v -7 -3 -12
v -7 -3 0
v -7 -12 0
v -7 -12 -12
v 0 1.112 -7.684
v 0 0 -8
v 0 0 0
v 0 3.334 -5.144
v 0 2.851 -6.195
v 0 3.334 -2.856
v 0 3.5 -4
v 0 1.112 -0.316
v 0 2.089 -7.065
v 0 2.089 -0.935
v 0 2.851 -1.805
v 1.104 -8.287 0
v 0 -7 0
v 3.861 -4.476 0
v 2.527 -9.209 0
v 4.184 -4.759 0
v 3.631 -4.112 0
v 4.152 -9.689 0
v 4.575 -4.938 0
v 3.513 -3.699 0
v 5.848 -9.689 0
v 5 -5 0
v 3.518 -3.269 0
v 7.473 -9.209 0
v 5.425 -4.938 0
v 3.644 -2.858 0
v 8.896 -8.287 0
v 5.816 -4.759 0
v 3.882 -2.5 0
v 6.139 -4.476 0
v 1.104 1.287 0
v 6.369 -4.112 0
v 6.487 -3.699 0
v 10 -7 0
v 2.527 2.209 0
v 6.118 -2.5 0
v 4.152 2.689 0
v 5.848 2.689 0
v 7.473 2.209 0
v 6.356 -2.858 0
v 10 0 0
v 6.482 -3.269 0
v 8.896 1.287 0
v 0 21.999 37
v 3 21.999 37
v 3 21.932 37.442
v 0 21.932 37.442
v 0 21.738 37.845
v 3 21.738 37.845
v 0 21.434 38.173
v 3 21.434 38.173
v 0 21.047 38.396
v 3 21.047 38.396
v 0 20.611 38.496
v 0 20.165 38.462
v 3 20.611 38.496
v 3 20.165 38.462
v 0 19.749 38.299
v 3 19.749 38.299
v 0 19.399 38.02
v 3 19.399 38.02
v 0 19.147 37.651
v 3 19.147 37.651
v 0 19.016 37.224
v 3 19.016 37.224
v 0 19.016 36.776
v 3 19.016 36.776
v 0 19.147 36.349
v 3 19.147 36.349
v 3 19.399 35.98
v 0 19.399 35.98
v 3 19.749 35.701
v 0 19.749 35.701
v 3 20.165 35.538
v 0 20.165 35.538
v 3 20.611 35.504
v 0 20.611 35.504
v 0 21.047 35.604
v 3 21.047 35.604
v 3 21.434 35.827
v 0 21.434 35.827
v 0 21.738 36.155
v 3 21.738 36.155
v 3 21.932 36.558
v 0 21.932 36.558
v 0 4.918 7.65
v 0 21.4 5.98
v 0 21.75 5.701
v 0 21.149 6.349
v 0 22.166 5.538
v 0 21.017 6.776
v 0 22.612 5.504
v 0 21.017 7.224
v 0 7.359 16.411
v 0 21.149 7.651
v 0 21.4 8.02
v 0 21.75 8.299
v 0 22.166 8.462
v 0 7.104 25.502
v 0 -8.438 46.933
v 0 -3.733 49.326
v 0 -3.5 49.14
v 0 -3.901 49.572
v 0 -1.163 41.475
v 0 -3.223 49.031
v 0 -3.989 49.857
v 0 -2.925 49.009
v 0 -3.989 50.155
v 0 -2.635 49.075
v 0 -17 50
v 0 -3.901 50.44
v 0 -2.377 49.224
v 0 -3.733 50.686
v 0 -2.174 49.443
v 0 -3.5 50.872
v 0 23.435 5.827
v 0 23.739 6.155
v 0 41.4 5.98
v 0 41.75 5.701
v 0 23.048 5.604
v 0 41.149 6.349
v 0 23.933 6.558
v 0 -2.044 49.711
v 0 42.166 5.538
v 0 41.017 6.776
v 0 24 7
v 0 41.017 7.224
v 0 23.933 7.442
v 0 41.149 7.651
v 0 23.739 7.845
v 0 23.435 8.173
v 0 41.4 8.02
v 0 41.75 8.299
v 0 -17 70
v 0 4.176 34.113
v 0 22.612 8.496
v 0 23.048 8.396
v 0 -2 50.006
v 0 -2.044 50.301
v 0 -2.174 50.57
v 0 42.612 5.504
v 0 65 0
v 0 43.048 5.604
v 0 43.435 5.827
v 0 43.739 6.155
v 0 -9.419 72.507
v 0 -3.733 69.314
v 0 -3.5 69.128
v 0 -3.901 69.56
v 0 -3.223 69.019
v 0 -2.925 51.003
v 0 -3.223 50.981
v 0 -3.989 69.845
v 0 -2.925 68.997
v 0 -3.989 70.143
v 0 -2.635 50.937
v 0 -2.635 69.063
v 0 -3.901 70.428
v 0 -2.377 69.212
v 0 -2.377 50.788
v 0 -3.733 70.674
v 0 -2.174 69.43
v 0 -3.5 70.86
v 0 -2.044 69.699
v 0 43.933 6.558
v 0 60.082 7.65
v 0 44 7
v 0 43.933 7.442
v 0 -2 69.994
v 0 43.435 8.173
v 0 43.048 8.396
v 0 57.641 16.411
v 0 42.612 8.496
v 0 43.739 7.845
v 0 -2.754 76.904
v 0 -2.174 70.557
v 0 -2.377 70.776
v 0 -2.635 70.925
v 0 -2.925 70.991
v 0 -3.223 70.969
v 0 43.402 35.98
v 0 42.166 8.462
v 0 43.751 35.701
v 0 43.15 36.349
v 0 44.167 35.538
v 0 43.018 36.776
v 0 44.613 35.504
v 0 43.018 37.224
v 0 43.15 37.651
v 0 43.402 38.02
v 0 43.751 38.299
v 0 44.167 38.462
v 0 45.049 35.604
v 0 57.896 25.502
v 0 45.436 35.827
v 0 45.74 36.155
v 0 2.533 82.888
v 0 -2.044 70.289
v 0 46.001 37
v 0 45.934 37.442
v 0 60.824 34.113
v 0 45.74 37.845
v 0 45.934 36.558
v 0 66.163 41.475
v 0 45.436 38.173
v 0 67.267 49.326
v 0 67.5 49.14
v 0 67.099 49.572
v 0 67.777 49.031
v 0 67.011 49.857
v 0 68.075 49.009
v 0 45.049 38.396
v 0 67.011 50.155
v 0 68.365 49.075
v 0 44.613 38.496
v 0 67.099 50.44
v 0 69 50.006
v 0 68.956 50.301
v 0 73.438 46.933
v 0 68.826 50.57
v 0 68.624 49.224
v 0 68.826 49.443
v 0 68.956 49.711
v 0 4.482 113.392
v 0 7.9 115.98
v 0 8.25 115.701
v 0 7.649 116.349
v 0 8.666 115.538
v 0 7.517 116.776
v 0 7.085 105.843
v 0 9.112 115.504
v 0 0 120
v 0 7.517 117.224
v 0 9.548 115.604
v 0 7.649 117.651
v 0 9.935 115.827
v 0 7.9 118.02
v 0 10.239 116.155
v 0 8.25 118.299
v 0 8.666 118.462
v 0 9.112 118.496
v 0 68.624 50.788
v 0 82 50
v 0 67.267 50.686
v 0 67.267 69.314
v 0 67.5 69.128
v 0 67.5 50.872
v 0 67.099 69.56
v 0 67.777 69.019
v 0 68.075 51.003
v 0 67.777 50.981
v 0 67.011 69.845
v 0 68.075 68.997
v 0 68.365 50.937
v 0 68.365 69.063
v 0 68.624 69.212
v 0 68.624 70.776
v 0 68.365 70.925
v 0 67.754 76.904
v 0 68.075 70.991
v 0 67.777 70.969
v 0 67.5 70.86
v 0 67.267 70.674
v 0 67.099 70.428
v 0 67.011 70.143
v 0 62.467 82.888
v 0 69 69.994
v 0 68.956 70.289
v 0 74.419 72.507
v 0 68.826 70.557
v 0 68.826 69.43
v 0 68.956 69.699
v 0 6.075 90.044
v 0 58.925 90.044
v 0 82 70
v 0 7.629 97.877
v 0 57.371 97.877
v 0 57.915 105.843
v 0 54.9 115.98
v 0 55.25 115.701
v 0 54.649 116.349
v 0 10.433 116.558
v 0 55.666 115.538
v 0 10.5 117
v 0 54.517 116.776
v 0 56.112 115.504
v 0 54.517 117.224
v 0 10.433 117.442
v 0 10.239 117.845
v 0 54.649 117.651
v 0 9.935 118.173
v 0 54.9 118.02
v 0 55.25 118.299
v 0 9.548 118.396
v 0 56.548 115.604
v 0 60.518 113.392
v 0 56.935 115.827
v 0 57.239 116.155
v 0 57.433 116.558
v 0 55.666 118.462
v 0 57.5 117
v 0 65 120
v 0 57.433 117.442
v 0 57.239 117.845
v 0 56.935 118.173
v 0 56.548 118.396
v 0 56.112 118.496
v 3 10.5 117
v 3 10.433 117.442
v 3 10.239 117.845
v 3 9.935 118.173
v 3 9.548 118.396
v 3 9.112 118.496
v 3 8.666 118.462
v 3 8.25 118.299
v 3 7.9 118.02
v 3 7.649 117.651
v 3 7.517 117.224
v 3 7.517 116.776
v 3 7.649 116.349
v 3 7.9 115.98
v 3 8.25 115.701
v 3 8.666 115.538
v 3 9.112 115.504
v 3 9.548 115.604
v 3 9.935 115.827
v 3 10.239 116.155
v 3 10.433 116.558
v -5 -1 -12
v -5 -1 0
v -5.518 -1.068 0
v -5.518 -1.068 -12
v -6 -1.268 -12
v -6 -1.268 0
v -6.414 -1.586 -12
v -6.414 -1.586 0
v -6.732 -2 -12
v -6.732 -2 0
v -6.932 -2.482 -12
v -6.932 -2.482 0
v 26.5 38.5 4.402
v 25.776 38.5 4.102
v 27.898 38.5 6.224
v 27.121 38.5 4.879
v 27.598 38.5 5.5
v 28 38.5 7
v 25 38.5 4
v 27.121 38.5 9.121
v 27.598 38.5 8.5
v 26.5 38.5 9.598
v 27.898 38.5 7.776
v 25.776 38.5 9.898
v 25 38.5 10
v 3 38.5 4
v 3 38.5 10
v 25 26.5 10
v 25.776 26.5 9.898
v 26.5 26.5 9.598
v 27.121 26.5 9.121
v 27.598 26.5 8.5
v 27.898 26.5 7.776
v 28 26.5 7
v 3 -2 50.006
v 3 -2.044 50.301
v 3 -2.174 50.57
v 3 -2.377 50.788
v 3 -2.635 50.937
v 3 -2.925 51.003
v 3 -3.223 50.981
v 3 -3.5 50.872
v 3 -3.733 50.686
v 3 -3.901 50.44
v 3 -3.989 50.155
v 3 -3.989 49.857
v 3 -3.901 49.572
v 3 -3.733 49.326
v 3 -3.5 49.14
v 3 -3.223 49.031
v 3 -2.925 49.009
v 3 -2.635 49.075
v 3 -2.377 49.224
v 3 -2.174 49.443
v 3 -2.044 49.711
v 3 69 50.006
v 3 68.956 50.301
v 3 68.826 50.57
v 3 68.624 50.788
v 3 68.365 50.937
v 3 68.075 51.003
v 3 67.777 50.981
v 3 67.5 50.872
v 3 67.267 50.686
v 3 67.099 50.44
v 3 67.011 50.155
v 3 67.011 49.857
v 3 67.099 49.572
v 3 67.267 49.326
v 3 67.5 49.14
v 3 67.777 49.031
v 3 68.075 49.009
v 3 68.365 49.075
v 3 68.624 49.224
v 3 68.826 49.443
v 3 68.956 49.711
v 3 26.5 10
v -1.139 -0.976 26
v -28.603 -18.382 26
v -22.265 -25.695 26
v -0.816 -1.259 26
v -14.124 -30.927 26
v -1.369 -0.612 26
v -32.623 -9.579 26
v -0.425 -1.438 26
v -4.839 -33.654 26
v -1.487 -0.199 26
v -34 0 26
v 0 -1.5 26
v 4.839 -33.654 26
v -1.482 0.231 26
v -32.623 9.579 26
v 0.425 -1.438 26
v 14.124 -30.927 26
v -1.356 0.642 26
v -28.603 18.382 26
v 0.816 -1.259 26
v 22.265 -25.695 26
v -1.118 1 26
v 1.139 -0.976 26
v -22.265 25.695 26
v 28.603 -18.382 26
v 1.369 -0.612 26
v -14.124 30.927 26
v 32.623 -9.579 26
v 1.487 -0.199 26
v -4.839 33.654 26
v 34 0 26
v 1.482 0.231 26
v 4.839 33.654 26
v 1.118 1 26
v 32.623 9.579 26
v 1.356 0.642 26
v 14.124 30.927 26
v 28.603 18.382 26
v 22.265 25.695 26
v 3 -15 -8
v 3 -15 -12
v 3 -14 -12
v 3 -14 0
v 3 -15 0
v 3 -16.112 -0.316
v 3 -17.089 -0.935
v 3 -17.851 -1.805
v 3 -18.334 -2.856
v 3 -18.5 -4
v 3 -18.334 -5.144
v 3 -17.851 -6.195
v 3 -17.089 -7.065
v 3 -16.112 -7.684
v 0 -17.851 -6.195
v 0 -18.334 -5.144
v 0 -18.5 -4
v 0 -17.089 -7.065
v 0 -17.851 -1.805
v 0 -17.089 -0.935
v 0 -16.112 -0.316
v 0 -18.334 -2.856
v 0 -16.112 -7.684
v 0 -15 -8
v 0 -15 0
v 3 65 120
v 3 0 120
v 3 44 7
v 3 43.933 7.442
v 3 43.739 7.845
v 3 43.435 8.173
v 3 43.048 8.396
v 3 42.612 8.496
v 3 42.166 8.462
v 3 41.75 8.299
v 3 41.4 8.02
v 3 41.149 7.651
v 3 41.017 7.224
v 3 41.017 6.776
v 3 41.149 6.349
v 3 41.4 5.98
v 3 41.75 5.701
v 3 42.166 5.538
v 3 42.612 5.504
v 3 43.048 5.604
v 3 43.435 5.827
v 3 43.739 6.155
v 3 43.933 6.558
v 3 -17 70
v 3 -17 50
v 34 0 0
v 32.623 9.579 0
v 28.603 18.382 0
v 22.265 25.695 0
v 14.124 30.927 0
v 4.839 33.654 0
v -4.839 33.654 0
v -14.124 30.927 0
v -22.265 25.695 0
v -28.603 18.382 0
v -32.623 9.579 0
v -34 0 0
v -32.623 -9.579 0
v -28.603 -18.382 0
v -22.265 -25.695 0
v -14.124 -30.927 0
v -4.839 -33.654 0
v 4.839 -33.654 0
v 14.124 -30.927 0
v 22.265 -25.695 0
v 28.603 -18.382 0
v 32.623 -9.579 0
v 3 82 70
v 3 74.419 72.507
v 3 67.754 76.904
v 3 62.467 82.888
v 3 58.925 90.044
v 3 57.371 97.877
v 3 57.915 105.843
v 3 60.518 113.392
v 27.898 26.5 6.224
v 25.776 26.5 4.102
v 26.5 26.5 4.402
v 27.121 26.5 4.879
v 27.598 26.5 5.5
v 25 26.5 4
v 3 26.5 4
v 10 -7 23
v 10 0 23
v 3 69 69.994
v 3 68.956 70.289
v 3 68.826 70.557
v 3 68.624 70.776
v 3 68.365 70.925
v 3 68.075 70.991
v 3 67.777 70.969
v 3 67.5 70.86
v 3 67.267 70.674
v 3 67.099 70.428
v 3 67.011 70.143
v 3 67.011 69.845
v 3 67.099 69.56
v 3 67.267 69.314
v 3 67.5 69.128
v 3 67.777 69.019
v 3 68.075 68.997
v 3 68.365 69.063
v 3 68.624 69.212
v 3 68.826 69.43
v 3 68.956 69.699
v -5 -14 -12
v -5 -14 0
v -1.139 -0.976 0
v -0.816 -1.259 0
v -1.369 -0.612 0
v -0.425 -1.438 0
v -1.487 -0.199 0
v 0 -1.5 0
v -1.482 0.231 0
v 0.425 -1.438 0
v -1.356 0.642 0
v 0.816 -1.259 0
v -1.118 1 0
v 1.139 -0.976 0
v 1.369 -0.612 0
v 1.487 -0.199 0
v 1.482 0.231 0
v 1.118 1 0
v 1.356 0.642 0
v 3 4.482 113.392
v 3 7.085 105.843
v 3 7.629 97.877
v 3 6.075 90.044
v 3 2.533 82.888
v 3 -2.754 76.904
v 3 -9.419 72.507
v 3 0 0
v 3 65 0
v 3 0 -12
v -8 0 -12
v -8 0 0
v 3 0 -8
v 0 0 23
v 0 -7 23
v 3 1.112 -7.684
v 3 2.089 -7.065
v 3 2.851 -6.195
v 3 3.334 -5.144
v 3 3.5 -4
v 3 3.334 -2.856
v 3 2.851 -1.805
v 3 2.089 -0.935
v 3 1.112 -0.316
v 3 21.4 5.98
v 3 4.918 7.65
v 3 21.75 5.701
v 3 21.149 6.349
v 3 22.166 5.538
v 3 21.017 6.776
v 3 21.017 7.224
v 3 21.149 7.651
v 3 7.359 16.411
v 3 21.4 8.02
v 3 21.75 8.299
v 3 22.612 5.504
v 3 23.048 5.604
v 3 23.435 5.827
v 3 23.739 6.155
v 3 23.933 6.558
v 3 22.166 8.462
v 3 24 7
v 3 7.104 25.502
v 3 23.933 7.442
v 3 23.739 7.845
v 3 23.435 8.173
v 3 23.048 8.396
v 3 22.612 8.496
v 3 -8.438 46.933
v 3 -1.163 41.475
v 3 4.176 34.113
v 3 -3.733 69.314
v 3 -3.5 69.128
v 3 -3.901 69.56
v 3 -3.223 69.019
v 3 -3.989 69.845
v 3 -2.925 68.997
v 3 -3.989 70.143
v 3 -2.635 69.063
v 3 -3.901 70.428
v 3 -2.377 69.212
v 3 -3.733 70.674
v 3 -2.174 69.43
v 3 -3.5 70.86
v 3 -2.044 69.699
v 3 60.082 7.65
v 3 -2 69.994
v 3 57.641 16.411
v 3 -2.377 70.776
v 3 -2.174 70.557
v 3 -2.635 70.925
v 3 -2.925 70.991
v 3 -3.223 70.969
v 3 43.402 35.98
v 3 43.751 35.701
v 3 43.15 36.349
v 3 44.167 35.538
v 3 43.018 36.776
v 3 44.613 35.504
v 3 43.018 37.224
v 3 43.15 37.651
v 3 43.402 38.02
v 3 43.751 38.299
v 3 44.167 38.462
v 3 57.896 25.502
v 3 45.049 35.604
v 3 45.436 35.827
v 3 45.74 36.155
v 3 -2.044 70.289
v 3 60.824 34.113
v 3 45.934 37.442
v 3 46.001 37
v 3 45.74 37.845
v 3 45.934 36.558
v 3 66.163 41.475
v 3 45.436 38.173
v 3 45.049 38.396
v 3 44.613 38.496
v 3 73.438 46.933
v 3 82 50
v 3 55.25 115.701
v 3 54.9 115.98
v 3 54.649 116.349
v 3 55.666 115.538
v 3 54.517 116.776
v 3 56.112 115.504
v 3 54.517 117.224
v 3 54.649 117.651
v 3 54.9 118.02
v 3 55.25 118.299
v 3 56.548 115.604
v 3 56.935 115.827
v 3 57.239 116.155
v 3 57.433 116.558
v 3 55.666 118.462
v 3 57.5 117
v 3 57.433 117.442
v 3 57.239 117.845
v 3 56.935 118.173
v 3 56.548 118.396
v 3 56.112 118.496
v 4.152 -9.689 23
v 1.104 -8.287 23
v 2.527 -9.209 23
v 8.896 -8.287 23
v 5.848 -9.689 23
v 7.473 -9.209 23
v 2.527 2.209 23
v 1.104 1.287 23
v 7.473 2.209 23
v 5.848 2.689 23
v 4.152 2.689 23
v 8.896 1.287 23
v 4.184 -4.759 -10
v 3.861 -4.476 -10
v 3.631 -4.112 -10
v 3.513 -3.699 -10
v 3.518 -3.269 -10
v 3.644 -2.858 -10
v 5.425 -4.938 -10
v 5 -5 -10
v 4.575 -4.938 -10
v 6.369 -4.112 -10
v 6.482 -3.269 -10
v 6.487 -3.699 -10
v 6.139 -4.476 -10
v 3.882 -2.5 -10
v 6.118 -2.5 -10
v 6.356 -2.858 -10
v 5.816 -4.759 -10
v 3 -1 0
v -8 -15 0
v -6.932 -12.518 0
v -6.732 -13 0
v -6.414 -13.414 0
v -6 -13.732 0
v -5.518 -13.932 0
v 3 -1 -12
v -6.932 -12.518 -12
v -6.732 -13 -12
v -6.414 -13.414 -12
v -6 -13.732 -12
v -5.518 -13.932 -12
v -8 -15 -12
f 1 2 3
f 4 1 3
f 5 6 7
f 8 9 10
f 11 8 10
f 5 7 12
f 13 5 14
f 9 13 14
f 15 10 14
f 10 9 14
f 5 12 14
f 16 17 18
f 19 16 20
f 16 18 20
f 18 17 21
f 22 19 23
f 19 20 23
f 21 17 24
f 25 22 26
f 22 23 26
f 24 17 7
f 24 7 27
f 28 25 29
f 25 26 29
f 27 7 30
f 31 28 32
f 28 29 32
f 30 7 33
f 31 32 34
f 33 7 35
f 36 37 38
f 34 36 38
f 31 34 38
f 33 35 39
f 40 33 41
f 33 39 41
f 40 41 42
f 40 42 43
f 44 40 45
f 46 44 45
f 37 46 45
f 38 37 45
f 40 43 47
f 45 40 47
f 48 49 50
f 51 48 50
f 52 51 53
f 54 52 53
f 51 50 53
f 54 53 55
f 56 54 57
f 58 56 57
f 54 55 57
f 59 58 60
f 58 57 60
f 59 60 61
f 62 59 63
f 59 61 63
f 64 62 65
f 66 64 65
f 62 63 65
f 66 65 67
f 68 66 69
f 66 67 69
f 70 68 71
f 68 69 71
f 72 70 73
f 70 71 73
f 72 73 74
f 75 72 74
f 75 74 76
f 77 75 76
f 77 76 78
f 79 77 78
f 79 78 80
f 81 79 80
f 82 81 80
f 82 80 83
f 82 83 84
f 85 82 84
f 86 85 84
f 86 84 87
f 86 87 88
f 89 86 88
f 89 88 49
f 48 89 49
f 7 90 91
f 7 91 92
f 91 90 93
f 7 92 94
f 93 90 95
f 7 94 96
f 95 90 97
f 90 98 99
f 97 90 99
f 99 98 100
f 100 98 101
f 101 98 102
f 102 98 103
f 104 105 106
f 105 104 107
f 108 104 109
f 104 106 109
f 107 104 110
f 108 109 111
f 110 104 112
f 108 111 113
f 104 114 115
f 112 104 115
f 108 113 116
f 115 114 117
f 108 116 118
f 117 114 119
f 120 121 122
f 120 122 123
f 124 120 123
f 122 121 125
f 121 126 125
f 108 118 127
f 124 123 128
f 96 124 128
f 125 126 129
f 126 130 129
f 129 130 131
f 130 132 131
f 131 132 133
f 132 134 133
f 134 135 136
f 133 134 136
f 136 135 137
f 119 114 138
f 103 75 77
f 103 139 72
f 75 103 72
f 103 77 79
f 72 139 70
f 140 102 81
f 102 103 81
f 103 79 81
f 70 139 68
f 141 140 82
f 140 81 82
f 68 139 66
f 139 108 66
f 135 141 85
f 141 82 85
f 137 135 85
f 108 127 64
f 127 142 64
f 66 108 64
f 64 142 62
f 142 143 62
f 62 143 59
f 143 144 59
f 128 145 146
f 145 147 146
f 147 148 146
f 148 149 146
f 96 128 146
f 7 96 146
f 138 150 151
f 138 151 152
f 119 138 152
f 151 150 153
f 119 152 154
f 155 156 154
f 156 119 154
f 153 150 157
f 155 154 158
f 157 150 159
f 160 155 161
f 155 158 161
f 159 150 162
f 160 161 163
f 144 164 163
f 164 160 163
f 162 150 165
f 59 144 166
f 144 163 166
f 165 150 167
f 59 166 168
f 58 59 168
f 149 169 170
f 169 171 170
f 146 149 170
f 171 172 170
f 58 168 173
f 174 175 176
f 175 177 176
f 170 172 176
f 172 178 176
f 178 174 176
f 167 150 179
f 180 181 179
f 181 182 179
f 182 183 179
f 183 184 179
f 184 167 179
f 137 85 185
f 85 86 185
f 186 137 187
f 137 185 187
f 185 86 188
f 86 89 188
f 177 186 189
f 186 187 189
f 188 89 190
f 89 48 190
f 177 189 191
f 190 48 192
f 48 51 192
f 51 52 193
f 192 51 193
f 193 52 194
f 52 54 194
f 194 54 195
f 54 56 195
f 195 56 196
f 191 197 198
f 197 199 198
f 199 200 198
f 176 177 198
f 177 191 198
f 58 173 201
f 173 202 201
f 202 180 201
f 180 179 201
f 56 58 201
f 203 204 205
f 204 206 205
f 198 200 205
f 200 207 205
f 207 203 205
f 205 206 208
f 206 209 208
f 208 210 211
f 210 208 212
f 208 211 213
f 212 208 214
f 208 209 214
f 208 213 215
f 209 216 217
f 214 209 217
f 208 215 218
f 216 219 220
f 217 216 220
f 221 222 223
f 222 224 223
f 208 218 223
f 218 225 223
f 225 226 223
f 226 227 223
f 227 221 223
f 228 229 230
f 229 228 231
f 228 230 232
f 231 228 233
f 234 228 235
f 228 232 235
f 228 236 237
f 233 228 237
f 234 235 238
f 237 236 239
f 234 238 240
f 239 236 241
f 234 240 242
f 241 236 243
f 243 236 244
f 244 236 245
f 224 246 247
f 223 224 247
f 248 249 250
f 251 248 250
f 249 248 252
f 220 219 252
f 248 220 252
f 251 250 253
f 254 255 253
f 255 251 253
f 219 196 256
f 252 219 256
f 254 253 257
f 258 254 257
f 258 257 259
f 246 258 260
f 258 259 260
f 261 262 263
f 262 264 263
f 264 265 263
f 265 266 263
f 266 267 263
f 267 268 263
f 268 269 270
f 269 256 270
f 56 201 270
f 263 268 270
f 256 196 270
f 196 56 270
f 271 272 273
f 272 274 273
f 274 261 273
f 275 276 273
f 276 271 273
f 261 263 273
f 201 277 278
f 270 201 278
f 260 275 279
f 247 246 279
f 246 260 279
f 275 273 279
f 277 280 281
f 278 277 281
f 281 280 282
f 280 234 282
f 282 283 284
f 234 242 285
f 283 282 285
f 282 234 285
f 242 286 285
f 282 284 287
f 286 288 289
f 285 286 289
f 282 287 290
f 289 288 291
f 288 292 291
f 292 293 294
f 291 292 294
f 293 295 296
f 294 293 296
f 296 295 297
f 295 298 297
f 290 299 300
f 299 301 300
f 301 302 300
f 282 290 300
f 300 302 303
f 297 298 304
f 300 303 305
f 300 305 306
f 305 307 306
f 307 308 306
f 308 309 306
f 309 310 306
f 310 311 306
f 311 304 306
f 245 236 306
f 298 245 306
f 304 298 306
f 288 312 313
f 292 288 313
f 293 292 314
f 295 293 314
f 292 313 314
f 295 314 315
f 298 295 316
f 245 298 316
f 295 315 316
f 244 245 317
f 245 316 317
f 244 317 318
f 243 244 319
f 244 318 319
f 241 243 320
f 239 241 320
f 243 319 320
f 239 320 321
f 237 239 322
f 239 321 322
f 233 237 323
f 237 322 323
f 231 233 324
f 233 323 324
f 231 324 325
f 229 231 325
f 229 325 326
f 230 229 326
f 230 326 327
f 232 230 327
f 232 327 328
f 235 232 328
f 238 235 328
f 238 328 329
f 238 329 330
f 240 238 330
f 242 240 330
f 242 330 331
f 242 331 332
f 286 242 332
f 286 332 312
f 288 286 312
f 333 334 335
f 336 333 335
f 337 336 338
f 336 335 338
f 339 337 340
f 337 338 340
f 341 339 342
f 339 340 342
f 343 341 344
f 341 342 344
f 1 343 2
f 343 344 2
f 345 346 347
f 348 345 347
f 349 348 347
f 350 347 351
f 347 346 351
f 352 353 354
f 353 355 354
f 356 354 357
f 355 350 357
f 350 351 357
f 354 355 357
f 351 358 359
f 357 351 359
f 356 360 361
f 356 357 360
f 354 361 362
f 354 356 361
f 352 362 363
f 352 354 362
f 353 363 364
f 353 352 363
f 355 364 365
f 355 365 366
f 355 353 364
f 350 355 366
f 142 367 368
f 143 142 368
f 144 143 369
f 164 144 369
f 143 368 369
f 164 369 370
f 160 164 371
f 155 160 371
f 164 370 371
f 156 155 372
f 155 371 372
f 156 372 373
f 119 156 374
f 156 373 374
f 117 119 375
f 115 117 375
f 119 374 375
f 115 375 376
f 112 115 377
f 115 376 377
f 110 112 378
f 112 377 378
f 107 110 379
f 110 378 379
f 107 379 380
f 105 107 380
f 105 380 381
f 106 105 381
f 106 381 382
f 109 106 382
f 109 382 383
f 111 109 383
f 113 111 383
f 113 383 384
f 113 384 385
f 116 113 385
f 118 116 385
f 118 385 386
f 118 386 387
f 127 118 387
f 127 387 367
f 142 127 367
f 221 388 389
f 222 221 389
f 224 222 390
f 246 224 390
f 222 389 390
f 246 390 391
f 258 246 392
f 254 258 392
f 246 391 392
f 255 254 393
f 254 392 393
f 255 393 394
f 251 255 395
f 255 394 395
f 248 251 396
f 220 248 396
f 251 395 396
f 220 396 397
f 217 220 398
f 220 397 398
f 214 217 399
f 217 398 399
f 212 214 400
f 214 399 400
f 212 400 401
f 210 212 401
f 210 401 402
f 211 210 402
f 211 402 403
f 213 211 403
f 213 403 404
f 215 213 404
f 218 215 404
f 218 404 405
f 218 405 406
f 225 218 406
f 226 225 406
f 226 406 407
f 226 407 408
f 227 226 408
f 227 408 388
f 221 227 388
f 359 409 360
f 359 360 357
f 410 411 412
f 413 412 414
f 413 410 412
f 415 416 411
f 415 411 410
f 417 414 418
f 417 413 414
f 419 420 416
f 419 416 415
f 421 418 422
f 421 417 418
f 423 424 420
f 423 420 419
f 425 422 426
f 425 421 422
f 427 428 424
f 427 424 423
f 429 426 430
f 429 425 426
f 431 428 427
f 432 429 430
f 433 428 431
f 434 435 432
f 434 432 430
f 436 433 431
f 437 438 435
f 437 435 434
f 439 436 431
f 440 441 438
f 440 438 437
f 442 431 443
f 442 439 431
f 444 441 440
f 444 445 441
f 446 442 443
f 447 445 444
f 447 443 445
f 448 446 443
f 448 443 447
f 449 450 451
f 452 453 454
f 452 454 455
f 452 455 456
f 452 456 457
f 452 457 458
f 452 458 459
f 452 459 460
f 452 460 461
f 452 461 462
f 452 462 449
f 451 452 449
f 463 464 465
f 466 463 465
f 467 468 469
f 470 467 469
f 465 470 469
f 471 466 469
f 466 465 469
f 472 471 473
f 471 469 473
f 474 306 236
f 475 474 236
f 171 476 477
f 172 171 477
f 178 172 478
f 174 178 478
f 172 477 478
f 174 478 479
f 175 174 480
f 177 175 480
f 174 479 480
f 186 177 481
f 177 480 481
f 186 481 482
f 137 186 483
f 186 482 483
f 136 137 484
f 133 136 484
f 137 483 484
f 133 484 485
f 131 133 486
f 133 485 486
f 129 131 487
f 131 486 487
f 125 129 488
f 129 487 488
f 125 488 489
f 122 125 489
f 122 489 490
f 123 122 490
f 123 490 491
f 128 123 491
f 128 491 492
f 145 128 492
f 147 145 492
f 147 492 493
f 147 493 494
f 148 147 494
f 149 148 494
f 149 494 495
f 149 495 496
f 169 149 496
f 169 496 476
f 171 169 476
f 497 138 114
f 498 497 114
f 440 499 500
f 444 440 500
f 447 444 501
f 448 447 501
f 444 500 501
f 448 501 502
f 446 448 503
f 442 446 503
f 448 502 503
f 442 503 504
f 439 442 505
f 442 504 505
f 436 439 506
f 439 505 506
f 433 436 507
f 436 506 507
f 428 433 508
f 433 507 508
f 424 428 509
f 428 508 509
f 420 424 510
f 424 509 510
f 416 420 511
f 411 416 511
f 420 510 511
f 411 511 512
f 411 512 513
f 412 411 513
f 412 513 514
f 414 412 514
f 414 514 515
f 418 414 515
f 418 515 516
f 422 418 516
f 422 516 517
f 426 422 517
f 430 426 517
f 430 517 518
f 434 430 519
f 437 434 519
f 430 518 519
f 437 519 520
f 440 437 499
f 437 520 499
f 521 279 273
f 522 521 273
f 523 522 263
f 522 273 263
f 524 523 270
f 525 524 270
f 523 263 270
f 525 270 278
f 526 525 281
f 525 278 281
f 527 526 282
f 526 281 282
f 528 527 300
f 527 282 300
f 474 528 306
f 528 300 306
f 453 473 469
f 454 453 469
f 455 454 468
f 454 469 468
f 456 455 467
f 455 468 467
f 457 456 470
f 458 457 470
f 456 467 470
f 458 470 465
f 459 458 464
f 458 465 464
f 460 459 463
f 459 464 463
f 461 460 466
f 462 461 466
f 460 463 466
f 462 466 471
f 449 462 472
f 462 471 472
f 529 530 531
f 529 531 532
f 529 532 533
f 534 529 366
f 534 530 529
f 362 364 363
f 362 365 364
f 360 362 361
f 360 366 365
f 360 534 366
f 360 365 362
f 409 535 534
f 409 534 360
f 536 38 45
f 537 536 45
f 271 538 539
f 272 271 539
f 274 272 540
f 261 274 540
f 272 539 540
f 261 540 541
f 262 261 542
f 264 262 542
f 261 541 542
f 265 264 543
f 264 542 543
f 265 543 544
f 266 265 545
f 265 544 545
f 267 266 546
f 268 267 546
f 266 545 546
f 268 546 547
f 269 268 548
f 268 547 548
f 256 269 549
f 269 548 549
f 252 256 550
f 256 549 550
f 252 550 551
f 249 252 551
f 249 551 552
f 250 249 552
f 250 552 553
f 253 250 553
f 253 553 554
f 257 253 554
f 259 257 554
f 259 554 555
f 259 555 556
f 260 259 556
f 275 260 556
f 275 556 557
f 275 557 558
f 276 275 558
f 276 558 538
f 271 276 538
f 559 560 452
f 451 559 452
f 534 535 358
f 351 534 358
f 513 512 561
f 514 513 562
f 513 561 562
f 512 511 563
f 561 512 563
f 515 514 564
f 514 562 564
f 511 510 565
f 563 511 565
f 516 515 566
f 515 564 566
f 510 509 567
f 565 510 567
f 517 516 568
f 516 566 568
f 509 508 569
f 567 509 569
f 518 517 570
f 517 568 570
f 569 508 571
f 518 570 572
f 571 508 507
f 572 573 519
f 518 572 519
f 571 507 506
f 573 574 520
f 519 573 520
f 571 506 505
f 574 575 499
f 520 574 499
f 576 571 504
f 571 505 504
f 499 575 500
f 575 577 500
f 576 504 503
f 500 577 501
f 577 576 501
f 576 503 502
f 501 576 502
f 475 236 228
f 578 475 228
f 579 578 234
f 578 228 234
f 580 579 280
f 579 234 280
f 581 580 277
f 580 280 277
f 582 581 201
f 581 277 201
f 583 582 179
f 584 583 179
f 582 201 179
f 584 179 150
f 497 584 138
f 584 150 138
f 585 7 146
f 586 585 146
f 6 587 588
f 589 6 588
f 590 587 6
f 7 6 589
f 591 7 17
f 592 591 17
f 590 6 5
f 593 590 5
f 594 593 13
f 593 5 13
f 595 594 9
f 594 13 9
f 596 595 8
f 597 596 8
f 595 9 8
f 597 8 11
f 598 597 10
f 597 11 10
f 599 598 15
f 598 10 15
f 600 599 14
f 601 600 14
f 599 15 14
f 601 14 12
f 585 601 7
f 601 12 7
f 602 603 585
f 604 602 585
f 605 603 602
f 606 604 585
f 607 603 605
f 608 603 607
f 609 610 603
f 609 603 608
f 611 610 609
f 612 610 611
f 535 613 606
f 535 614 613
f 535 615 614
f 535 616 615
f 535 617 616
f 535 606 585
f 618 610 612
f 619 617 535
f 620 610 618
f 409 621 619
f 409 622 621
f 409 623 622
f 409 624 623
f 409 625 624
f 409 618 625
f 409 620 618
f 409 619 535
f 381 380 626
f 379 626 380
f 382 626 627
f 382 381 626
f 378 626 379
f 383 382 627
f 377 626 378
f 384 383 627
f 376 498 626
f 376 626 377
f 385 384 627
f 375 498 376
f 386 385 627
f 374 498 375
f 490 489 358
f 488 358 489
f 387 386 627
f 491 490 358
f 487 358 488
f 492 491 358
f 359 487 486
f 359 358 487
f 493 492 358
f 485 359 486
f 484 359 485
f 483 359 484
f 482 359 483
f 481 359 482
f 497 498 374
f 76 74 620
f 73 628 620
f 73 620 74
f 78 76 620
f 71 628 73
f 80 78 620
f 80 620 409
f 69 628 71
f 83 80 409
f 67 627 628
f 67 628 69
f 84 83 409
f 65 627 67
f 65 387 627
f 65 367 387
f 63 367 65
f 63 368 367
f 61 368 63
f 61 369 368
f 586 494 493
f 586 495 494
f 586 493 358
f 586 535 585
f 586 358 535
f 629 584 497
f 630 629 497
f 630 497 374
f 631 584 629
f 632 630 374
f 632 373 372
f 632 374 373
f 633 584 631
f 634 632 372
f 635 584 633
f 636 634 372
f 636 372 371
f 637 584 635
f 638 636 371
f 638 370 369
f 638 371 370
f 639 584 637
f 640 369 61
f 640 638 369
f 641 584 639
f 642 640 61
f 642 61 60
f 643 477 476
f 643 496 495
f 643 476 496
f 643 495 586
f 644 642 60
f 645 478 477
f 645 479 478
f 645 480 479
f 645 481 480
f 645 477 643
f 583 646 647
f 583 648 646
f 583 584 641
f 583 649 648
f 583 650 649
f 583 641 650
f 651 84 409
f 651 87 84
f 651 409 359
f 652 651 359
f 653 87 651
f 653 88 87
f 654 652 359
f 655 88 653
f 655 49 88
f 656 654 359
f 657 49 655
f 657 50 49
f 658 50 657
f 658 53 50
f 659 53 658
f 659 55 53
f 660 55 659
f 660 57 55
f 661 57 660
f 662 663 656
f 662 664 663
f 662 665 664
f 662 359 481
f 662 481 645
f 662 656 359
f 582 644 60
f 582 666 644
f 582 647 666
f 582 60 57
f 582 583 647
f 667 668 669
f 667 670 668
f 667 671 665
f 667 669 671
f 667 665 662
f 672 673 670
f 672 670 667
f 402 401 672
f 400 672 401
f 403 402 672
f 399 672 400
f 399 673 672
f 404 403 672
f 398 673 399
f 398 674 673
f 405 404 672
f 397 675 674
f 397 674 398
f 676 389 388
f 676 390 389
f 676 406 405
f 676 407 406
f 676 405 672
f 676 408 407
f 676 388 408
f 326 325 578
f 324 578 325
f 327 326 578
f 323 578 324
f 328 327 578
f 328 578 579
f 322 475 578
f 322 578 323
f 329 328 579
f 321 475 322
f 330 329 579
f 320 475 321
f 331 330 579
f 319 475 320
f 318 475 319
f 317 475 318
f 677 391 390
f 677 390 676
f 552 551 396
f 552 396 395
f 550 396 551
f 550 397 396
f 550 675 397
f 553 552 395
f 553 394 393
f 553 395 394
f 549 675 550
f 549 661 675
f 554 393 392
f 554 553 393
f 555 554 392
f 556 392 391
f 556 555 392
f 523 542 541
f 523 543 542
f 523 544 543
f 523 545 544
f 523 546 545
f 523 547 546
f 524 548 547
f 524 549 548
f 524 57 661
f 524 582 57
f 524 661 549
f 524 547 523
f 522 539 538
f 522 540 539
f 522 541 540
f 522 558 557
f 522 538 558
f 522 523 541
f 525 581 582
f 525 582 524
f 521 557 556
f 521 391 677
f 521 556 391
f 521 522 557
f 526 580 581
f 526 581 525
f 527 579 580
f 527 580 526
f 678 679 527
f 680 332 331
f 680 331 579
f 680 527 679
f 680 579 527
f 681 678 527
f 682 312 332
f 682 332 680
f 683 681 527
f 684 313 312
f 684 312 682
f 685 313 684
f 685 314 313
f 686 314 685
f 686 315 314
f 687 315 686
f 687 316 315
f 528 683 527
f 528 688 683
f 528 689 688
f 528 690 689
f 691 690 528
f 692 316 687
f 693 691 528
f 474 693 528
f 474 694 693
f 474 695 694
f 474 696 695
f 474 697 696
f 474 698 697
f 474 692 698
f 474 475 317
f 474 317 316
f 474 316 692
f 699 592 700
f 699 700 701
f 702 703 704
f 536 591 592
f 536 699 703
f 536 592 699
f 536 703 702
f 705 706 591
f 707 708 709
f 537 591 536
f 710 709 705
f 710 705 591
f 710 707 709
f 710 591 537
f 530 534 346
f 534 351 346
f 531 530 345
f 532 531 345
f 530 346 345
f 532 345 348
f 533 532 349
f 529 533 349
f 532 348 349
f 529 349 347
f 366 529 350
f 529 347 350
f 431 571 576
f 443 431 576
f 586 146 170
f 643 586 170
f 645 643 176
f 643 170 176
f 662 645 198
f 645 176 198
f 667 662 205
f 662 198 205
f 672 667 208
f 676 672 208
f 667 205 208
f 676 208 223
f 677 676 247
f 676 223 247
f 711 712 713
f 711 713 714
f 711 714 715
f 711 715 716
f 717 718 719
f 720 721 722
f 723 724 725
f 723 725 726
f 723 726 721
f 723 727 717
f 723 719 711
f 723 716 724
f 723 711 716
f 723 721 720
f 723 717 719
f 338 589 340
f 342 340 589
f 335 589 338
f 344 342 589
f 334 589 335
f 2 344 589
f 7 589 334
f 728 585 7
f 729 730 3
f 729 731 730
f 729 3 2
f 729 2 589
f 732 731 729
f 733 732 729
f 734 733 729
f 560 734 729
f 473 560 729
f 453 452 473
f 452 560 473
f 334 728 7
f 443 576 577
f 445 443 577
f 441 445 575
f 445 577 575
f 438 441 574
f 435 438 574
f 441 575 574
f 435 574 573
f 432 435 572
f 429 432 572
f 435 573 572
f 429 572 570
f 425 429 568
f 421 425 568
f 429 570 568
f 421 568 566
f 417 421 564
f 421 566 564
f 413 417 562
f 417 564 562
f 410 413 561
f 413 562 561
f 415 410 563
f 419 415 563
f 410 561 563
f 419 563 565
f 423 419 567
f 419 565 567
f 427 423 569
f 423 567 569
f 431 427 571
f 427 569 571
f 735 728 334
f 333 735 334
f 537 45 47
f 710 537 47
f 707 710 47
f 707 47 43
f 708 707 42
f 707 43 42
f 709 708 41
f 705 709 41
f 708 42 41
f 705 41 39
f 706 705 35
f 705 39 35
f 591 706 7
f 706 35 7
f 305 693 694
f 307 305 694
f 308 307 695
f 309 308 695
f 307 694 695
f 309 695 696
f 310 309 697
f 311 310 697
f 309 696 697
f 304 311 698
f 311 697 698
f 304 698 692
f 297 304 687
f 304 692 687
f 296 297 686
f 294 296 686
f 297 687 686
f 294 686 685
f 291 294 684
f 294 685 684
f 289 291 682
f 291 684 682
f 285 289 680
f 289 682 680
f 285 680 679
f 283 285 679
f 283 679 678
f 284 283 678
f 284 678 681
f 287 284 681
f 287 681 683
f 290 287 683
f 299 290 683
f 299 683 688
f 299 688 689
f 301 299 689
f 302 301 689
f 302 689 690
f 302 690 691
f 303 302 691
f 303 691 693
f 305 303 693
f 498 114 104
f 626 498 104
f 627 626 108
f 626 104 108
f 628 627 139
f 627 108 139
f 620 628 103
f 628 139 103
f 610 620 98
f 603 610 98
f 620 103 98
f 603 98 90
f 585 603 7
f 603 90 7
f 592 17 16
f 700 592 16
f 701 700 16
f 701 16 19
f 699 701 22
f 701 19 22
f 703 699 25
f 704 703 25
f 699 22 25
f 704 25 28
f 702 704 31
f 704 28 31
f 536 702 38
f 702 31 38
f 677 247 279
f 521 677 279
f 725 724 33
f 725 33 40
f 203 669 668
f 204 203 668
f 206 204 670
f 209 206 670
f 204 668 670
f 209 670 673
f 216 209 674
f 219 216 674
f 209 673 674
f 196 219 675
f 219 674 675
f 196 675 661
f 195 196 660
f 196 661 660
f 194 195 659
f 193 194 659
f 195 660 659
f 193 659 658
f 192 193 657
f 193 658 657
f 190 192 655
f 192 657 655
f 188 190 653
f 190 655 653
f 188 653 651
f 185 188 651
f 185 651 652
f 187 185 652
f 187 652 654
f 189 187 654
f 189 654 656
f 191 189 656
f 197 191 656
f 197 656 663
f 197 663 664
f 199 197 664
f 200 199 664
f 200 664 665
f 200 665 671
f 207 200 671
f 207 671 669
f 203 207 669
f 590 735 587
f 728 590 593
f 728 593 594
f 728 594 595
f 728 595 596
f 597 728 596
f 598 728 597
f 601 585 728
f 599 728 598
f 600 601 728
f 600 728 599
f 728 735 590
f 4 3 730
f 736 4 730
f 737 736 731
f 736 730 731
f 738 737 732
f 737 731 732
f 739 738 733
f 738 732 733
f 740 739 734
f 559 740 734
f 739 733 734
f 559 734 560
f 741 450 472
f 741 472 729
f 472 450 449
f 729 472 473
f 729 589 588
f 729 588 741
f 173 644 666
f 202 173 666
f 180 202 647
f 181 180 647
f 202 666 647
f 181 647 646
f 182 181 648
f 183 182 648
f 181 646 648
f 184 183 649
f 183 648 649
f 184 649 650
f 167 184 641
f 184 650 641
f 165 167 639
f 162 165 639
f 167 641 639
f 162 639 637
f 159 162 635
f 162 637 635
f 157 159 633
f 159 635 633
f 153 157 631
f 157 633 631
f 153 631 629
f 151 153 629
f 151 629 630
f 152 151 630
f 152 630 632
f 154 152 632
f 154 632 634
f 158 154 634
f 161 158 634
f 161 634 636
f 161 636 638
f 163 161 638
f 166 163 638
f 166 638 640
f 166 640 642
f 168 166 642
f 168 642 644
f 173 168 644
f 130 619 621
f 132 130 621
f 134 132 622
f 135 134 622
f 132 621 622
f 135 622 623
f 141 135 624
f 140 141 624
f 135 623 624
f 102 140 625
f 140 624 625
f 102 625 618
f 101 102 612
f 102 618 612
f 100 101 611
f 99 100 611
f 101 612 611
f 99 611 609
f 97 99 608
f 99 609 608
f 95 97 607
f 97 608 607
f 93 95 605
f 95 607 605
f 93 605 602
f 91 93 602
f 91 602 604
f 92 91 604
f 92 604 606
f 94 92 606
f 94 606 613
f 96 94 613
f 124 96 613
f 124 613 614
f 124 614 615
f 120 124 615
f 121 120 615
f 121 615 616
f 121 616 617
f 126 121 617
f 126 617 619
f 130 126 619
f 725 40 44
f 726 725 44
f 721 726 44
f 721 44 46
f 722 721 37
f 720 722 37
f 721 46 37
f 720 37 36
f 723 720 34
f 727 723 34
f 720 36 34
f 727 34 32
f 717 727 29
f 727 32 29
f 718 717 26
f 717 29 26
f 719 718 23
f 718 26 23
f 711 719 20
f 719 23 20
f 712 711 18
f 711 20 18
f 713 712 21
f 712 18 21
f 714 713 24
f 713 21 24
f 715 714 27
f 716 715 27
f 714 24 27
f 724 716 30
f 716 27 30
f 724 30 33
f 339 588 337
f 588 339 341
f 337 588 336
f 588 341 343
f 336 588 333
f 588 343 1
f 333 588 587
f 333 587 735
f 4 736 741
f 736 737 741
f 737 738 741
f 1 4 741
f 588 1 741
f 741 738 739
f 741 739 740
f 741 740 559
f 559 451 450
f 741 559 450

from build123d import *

# Parameters (mm, degrees)
F0_R      = 34
F1_DEPTH  = 26
F3_DEPTH  = 26
F5_DEPTH  = 23
F7_DEPTH  = 10
F9_DEPTH  = 3
F10_W     = 15
F10_H     = 12
F11_DEPTH = 8
F13_DEPTH = 25
F15_DEPTH = 3
F16_W     = 12
F16_H     = 6
F17_DEPTH = 25
F19_R     = 2.99999
F18_R     = 1
F18_R_2   = 1.5
F20_DEPTH = 25


# Not quite as in the source:
# - a fillet or chamfer is up to 0.001 mm smaller than in the source, because OpenCascade refuses the exact size


with BuildPart() as f1:
    # F0 (on Top) → F1 (new body)
    with BuildSketch(Plane.XY):
        Circle(F0_R)
    extrude(amount=F1_DEPTH)

    # F2 (on face) → F3 (cut)
    with BuildSketch(Plane(origin=(0, 0, 0), x_dir=(1, 0, 0), z_dir=(0, 0, -1))):
        with BuildLine():
            Line((-1.1180339887, -1), (1.1180339887, -1))
            ThreePointArc((1.1180339887, -1), (0, 1.5), (-1.1180339887, -1))
        make_face()
    extrude(amount=-F3_DEPTH, mode=Mode.SUBTRACT)


with BuildPart() as f5:
    # F4 (on Top) → F5 (new body)
    with BuildSketch(Plane.XY):
        with BuildLine():
            ThreePointArc((10, 0), (5, 2.75), (0, 0))
            Line((0, 0), (0, -7))
            ThreePointArc((0, -7), (5, -9.75), (10, -7))
            Line((10, -7), (10, 0))
        make_face()
    extrude(amount=F5_DEPTH)

    # F6 (on face) → F7 (join)
    with BuildSketch(Plane(origin=(0, 0, 0), x_dir=(1, 0, 0), z_dir=(0, 0, -1))):
        with BuildLine():
            Line((3.8819660113, 2.5), (6.1180339887, 2.5))
            ThreePointArc((6.1180339887, 2.5), (5, 5), (3.8819660113, 2.5))
        make_face()
    extrude(amount=F7_DEPTH)


with BuildPart() as f9:
    # F8 (on Right) → F9 (new body)
    with BuildSketch(Plane.YZ):
        with BuildLine():
            ThreePointArc((0, -8), (3.5, -4), (0, 0))
            Line((0, 0), (-15, 0))
            ThreePointArc((-15, 0), (-18.5, -4), (-15, -8))
            Line((-15, -8), (-15, -12))
            Line((-15, -12), (0, -12))
            Line((0, -12), (0, -8))
        make_face()
    extrude(amount=F9_DEPTH)

    # F10 (on face) → F11 (join)
    with BuildSketch(Plane(origin=(0, 0, 0), x_dir=(0, -1, 0), z_dir=(-1, 0, 0))):
        with Locations((7.5, -6)):
            Rectangle(F10_W, F10_H)
    extrude(amount=F11_DEPTH)

    # F12 (on face) → F13 (cut)
    with BuildSketch(Plane.XY):
        with BuildLine():
            Line((3, -14), (3, -1))
            Line((3, -1), (-5, -1))
            ThreePointArc((-5, -1), (-6.4142135624, -1.5857864376), (-7, -3))
            Line((-7, -3), (-7, -12))
            ThreePointArc((-7, -12), (-6.4142135624, -13.4142135624), (-5, -14))
            Line((-5, -14), (3, -14))
        make_face()
    extrude(amount=-F13_DEPTH, mode=Mode.SUBTRACT)


with BuildPart() as f15:
    # F14 (on Right) → F15 (new body)
    with BuildSketch(Plane.YZ):
        with BuildLine():
            Line((-17, 70), (-17, 50))
            ThreePointArc((-17, 50), (5.9634758444, 29.9175817871), (0, 0))
            Line((0, 0), (65, 0))
            ThreePointArc((65, 0), (59.0365241556, 29.9175817871), (82, 50))
            Line((82, 50), (82, 70))
            ThreePointArc((82, 70), (58.9246735824, 90.044389018), (65, 120))
            Line((65, 120), (0, 120))
            ThreePointArc((0, 120), (6.0753264176, 90.044389018), (-17, 70))
        make_face()
    extrude(amount=F15_DEPTH)

    # F16 (on face) → F17 (join)
    with BuildSketch(Plane.YZ.offset(3)):
        with Locations((32.5, 7)):
            Rectangle(F16_W, F16_H)
    extrude(amount=F17_DEPTH)

    # F19 (radius 3 in the source; OpenCascade refuses exactly that, so slightly less here)
    f19_edges = [f15.edges().sort_by_distance(p)[0] for p in [
        (28, 32.5, 10),
        (28, 32.5, 4),
    ]]
    fillet(f19_edges, radius=F19_R)

    # F18 (on face) → F20 (cut)
    with BuildSketch(Plane.YZ.offset(3)):
        with Locations((68.0000194097, 50.0062304962)):
            Circle(F18_R)
        with Locations((68.0000194097, 69.9937695038)):
            Circle(F18_R)
        with Locations((-3.0000194097, 50.0062304962)):
            Circle(F18_R)
        with Locations((-3.0000194097, 69.9937695038)):
            Circle(F18_R)
        with Locations((22.5, 7)):
            Circle(F18_R_2)
        with Locations((42.5, 7)):
            Circle(F18_R_2)
        with Locations((9, 117)):
            Circle(F18_R_2)
        with Locations((56, 117)):
            Circle(F18_R_2)
        with Locations((20.4988960177, 37)):
            Circle(F18_R_2)
        with Locations((44.5011039823, 37)):
            Circle(F18_R_2)
    extrude(amount=-F20_DEPTH, mode=Mode.SUBTRACT)


solid = Compound([f1.part, f5.part, f9.part, f15.part])
